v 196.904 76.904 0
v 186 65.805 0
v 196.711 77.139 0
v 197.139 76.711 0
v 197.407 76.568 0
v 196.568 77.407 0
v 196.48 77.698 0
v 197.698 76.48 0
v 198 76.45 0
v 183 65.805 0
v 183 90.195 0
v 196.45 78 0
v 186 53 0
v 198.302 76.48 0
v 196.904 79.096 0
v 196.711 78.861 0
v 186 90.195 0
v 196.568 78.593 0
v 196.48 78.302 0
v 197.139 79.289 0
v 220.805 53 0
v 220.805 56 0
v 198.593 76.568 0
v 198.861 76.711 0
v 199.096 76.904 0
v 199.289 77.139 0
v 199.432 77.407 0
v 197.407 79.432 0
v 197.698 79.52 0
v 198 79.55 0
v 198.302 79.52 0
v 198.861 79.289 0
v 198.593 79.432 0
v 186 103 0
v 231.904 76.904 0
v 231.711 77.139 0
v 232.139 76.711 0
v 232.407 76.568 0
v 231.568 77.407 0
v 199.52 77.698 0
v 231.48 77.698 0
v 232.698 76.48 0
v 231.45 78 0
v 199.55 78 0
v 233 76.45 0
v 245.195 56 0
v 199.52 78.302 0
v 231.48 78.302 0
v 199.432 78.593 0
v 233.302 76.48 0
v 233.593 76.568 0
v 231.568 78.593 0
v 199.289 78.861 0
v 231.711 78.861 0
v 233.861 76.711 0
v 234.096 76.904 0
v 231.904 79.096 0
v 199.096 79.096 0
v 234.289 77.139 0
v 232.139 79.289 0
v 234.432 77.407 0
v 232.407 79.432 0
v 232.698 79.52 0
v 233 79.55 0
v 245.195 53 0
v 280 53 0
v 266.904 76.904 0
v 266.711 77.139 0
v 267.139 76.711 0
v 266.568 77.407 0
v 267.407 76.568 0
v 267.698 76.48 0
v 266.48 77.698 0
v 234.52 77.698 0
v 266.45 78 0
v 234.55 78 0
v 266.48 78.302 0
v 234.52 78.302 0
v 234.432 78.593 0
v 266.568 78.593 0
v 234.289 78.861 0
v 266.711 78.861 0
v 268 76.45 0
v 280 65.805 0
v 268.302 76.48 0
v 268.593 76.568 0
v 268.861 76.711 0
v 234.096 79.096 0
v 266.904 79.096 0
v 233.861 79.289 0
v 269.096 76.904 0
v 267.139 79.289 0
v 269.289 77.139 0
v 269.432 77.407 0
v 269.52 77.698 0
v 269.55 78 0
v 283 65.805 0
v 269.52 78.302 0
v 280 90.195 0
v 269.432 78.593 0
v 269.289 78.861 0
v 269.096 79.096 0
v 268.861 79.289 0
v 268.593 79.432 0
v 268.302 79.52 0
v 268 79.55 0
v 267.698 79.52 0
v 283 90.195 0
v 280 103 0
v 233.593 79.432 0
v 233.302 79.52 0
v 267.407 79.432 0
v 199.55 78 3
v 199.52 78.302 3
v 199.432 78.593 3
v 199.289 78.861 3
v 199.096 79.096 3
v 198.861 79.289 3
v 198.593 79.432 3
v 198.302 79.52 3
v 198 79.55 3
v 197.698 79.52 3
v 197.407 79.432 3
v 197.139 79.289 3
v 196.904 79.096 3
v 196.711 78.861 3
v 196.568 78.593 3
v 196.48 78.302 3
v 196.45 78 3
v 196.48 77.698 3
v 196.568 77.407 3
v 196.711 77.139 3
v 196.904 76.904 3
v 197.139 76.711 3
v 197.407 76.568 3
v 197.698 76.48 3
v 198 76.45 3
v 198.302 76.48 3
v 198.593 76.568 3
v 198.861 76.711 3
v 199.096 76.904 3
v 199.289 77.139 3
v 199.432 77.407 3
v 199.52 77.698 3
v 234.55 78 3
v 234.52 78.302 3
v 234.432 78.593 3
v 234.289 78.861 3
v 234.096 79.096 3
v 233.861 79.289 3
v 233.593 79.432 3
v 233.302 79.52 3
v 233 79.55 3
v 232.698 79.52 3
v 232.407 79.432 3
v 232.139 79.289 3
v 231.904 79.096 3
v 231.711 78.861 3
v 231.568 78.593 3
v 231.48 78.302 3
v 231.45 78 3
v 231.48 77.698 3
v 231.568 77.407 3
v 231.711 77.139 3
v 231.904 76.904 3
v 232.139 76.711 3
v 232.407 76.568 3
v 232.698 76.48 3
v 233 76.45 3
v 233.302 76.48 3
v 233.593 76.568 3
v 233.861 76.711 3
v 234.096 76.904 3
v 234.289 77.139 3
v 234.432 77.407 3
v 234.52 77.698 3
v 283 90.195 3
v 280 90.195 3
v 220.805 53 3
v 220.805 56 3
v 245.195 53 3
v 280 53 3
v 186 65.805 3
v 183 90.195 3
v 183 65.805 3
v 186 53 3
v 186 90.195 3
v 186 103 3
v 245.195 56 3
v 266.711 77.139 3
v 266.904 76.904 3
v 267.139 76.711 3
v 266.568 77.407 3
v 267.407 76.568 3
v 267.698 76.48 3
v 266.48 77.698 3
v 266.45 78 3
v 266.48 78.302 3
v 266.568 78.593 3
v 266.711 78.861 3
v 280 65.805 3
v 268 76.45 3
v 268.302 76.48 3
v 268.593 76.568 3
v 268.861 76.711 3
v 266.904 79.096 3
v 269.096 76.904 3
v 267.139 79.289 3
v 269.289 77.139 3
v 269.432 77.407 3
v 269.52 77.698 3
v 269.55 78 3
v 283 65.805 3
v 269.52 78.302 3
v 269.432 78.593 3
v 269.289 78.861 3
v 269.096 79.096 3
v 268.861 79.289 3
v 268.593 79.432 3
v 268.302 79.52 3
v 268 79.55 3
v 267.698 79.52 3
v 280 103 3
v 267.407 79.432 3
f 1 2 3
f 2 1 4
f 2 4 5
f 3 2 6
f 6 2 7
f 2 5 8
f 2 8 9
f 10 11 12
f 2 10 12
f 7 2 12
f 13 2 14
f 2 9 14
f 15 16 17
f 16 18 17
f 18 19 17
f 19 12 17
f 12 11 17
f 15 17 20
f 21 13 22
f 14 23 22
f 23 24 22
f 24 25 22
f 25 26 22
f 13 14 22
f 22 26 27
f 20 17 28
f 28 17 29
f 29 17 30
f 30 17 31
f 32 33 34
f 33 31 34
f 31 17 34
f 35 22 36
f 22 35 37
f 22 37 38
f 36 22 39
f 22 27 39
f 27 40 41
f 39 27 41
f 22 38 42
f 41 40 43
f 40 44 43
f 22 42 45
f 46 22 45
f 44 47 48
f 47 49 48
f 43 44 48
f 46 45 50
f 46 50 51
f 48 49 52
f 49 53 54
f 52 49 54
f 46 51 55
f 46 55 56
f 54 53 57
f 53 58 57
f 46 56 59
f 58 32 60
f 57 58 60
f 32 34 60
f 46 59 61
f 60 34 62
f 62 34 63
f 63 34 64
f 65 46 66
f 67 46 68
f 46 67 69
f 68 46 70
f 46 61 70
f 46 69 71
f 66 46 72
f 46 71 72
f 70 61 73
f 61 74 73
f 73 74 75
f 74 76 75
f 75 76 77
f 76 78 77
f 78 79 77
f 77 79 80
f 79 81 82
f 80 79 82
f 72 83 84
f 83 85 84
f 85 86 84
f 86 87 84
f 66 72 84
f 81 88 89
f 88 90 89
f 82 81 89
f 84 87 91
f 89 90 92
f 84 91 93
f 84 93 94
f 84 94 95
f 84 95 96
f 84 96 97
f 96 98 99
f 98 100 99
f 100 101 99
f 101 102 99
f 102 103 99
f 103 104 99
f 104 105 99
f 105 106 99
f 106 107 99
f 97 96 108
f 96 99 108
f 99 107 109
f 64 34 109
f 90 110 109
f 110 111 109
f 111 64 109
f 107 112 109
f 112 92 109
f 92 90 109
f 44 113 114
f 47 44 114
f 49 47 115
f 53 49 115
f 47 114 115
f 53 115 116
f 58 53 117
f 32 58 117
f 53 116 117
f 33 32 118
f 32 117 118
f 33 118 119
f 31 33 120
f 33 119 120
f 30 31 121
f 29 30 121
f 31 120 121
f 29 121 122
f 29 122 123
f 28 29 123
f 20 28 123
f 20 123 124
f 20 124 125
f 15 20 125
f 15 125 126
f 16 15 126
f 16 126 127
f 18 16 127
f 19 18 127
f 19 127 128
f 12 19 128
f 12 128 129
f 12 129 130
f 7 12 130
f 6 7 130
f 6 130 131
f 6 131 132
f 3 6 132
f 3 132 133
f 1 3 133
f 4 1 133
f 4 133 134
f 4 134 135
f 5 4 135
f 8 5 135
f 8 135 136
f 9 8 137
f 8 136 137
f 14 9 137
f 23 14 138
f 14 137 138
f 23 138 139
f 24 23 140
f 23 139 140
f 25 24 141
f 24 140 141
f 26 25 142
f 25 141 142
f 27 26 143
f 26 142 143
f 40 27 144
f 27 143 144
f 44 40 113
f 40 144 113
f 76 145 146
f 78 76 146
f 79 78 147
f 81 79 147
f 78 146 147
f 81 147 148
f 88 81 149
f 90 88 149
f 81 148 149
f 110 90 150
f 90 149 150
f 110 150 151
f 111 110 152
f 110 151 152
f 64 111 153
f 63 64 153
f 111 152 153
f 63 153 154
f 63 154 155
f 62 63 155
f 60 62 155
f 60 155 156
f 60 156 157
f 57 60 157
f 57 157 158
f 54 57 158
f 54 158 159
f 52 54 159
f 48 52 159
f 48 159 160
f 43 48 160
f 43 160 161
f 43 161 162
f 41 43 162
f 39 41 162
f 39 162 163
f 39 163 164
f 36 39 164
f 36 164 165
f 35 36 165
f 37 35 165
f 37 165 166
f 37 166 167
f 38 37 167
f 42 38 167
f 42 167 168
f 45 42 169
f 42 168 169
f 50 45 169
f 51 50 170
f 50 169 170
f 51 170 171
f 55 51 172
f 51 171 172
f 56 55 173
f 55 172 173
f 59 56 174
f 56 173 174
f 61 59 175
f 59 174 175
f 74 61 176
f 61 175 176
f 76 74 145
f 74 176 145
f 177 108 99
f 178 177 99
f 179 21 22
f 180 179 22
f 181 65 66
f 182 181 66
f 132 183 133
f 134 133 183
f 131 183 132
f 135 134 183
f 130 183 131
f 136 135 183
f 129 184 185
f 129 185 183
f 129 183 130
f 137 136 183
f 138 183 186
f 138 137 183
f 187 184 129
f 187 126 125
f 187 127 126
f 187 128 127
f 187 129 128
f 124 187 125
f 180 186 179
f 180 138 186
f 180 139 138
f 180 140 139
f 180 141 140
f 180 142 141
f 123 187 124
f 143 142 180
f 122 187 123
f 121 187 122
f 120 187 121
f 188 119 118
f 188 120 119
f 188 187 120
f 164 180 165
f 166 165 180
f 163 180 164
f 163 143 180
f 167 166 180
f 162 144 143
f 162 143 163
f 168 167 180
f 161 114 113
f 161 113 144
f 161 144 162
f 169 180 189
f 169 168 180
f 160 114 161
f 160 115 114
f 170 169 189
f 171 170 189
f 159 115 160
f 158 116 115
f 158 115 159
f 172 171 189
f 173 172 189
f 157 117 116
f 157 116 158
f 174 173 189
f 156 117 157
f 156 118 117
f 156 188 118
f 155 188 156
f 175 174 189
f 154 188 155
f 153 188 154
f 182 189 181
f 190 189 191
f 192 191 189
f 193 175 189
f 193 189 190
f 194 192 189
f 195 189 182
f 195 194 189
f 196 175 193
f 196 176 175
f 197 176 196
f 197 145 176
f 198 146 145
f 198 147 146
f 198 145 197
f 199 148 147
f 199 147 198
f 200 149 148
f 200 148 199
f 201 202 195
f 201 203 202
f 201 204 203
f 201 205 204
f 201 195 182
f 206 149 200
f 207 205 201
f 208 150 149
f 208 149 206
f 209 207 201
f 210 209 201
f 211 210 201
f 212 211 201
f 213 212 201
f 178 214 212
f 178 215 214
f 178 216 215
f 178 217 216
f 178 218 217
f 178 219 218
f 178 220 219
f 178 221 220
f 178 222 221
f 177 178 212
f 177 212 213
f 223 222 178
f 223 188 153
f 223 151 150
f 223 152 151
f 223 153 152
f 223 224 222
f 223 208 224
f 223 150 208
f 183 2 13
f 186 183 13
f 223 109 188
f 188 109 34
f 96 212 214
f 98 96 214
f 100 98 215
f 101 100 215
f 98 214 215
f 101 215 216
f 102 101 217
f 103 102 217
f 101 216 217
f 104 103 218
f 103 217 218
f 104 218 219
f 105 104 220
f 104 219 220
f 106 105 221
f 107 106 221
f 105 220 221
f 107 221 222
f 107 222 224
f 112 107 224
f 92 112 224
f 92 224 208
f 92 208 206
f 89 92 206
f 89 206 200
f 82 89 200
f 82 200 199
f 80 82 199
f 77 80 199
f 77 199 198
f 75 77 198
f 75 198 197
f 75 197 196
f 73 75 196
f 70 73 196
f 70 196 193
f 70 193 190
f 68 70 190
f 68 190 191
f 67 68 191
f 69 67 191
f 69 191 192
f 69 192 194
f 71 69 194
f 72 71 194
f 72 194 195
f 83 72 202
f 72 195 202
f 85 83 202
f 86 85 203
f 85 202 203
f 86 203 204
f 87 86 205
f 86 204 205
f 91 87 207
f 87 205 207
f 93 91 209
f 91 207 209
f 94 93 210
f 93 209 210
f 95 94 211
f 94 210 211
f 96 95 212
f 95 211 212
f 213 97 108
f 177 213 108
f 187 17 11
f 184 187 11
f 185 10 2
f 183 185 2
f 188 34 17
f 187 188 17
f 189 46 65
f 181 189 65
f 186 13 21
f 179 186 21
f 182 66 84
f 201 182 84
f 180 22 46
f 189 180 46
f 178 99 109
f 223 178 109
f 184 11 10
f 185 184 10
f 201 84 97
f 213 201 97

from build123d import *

# Parameters (mm, degrees)
SALIENTE_EXTRUIR1_DEPTH = 3
CROQUIS1_R              = 1.55
CORTAR_EXTRUIR1_DEPTH   = 10


with BuildPart() as part:
    # Model → Saliente-Extruir1 (new body)
    with BuildSketch(Plane.XY):
        Polygon((186, 103), (186, 90.195), (183, 90.195), (183, 65.805), (186, 65.805), (186, 53), (220.805, 53), (220.805, 56), (245.195, 56), (245.195, 53), (269.585, 53), (280, 53), (280, 65.805), (283, 65.805), (283, 90.195), (280, 90.195), (280, 103), align=None)
    extrude(amount=SALIENTE_EXTRUIR1_DEPTH)

    # Croquis1 → Cortar-Extruir1 (cut)
    with BuildSketch(Plane.XY.offset(3)):
        with Locations((233, 78)):
            Circle(CROQUIS1_R)
        with Locations((198, 78)):
            Circle(CROQUIS1_R)
        with Locations((268, 78)):
            Circle(CROQUIS1_R)
    extrude(amount=-CORTAR_EXTRUIR1_DEPTH, mode=Mode.SUBTRACT)


solid = part.part
